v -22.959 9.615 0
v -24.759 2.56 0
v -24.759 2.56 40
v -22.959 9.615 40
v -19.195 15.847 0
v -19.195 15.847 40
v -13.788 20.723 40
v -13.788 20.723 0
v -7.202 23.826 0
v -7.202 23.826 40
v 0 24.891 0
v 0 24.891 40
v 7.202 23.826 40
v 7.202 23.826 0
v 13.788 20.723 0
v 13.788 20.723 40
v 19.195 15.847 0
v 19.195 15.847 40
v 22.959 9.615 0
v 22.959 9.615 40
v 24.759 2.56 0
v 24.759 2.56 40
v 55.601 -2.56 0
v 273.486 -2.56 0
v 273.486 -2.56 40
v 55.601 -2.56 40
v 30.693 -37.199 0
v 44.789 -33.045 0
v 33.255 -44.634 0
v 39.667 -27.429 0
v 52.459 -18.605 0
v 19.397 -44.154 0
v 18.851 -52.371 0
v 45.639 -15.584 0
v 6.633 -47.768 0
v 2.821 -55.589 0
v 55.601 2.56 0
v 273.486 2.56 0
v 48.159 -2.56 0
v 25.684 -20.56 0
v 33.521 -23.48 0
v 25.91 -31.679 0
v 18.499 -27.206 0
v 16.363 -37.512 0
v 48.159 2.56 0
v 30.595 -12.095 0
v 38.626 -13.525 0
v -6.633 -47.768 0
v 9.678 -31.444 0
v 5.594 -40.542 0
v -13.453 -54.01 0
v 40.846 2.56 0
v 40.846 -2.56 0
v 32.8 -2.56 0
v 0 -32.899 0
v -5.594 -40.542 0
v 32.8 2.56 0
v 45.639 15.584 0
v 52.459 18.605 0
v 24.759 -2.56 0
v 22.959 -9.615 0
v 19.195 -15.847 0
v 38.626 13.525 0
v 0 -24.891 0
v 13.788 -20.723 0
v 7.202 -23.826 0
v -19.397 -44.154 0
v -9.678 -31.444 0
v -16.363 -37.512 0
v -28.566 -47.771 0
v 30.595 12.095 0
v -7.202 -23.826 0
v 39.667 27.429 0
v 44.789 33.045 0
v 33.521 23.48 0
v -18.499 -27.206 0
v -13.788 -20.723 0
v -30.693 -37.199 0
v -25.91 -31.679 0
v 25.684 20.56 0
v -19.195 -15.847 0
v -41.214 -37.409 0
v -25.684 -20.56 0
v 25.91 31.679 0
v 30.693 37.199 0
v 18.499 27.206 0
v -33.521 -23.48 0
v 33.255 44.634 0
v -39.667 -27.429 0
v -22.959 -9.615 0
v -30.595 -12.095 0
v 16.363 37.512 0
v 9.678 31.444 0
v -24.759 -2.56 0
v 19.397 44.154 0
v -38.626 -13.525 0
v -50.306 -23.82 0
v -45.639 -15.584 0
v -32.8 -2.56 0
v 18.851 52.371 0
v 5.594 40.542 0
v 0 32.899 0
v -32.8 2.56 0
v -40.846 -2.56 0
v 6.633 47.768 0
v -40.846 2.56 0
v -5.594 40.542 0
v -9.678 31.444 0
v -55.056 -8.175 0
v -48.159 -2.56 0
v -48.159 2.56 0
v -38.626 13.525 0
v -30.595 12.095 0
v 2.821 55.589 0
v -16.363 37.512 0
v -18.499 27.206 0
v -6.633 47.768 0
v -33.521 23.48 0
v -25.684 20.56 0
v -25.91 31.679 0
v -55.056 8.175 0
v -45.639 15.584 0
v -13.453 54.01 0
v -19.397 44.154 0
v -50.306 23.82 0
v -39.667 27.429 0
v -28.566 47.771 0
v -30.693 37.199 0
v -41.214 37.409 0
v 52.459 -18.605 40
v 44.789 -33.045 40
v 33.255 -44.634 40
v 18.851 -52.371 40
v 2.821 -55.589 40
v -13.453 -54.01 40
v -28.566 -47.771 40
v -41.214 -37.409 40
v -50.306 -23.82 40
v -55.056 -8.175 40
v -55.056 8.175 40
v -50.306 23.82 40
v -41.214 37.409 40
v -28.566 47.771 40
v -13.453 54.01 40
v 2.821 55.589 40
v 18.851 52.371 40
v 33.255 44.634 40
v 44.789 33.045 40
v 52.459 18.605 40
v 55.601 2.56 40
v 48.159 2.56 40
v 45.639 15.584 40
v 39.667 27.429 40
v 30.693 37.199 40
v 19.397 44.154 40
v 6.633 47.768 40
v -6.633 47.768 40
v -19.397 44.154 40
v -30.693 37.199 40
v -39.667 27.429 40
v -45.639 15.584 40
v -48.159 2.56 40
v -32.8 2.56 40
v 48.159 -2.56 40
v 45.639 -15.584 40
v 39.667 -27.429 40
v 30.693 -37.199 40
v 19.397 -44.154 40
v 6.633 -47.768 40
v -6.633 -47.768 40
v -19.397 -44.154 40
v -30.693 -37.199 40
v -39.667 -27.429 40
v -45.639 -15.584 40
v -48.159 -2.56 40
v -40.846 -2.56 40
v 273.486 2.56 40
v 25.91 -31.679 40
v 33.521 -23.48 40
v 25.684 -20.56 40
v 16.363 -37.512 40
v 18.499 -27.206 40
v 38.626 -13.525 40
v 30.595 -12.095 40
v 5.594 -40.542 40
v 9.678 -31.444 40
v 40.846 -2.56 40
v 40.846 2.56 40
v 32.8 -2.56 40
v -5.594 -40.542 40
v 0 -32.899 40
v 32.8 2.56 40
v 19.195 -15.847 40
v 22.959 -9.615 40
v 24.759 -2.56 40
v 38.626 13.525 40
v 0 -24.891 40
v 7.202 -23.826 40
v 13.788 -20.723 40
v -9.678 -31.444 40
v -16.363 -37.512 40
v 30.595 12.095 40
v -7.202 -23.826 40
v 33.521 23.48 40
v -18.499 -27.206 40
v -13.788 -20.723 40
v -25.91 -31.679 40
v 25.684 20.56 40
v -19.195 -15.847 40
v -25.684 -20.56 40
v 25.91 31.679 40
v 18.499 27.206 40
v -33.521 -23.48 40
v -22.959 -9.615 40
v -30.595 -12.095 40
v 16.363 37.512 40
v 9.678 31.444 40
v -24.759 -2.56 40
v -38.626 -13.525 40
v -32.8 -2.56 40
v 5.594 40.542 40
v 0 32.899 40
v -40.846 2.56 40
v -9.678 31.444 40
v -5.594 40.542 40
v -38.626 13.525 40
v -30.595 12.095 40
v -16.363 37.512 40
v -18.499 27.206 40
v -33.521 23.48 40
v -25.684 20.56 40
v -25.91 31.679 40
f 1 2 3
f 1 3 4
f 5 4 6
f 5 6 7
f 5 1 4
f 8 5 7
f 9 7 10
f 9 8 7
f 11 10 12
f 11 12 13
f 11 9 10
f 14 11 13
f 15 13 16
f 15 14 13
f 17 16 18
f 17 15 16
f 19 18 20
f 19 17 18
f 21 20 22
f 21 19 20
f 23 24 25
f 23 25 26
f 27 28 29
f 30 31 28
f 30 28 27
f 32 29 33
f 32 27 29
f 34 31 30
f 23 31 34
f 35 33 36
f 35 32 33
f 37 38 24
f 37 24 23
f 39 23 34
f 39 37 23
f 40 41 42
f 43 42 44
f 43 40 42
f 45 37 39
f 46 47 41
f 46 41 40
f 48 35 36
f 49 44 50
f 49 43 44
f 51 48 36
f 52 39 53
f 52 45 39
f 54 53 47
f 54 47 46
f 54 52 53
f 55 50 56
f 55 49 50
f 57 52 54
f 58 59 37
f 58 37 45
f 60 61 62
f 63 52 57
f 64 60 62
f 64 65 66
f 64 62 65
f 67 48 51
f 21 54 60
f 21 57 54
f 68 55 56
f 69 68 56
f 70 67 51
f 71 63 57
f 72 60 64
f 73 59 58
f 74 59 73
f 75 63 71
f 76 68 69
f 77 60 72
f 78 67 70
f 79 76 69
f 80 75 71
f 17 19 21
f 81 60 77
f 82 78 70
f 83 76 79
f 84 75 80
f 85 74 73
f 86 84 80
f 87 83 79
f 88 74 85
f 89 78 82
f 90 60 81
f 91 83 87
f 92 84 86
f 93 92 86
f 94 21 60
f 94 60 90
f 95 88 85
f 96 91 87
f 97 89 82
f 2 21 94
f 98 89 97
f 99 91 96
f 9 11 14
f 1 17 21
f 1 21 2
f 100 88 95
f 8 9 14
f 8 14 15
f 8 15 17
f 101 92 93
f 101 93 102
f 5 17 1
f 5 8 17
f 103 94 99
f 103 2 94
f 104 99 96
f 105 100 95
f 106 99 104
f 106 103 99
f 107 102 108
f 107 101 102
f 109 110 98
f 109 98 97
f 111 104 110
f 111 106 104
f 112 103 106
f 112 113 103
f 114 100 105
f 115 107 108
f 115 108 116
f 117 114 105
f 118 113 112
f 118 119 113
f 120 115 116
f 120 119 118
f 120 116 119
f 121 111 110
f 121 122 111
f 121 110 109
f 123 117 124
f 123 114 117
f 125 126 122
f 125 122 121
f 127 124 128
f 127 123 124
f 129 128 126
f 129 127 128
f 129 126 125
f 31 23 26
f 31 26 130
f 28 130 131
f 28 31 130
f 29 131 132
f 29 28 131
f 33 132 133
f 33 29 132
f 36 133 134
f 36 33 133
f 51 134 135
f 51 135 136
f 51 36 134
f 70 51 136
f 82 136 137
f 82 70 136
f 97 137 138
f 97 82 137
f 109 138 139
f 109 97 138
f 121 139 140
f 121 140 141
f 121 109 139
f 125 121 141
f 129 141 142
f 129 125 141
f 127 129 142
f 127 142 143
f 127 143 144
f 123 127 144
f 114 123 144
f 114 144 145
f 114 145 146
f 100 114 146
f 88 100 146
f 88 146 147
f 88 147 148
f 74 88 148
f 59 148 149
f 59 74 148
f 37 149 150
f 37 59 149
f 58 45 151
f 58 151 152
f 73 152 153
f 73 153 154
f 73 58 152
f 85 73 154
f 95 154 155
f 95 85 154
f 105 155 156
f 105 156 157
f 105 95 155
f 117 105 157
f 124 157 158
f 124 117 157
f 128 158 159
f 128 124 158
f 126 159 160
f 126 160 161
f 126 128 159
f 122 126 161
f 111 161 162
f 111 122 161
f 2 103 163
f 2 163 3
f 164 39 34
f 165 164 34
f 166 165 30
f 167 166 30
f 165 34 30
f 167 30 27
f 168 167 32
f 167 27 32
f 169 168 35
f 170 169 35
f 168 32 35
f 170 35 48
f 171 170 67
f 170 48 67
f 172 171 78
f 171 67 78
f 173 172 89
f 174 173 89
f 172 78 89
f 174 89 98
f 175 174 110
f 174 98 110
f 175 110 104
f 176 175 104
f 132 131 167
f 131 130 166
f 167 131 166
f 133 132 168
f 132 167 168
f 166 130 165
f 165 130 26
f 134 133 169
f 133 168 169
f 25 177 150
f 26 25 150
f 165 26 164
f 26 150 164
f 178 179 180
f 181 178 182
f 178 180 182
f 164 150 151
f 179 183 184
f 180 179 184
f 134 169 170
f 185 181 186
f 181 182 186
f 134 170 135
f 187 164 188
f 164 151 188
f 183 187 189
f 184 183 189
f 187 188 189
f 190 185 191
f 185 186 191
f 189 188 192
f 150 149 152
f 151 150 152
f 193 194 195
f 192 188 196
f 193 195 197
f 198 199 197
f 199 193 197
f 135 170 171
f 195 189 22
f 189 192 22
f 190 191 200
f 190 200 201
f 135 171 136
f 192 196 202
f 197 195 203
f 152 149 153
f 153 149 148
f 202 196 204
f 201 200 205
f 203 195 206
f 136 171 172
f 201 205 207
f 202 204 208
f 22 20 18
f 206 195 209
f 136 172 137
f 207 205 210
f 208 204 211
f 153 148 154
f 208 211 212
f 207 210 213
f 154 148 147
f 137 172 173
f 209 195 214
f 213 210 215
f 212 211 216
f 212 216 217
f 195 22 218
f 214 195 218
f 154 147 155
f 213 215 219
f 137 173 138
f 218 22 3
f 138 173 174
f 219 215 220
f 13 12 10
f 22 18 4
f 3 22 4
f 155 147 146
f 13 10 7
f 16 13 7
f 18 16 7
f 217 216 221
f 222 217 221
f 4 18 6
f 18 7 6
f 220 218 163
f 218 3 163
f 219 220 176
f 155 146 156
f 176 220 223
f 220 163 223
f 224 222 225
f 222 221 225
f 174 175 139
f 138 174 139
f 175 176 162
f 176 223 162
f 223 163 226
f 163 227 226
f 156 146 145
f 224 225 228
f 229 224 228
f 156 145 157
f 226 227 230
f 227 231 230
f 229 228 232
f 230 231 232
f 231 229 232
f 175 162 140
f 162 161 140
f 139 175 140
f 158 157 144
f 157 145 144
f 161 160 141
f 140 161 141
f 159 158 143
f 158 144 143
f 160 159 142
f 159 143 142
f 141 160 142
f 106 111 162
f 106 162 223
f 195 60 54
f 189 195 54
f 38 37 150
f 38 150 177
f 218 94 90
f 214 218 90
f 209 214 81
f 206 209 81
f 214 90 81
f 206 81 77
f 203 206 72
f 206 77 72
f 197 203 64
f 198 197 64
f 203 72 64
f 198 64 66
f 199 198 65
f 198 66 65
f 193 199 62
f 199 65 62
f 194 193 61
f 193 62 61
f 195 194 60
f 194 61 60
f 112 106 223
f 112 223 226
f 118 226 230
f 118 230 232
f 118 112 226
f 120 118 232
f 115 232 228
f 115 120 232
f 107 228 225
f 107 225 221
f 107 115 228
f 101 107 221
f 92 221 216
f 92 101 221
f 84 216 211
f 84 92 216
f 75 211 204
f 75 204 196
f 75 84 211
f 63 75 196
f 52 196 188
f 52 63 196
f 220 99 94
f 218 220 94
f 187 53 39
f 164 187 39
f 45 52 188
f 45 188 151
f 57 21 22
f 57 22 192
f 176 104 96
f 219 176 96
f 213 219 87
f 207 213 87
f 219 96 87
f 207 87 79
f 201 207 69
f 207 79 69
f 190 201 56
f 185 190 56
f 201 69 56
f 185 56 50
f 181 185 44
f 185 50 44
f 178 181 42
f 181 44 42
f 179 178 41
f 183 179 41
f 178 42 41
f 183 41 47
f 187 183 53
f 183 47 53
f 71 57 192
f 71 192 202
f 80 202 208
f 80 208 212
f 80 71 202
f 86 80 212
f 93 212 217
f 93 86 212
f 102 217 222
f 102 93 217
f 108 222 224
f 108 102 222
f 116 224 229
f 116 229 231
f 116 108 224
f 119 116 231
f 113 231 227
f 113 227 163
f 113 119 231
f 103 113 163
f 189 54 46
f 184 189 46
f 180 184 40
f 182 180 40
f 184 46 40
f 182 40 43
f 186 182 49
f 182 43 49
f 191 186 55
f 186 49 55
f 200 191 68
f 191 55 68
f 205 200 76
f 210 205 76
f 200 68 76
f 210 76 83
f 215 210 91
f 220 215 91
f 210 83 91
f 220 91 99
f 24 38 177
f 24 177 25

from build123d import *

# Parameters (mm, degrees)
EXTRUDE_4_DEPTH = 40


with BuildPart() as part:
    # 草图2 → 凸台-拉伸4 (new body)
    with BuildSketch(Plane.XY):
        with BuildLine():
            Line((55.601230388, 2.559909891), (273.486476264, 2.559909891))
            Line((273.486476264, 2.559909891), (273.486476264, -2.559909891))
            Line((273.486476264, -2.559909891), (55.601230388, -2.559909891))
            ThreePointArc((55.601230388, -2.559909891), (-55.660128991, 0), (55.601230388, 2.559909891))
        make_face()
        with BuildLine():
            ThreePointArc((32.799591871, 2.559909891), (0, 32.899336856), (-32.799591871, 2.559909891))
            Line((-32.799591871, 2.559909891), (-24.758977016, 2.559909891))
            ThreePointArc((-24.758977016, 2.559909891), (0, 24.890963853), (24.758977016, 2.559909891))
            Line((24.758977016, 2.559909891), (32.799591871, 2.559909891))
        make_face(mode=Mode.SUBTRACT)
        with BuildLine():
            Line((-48.158715074, -2.559909891), (-40.845588283, -2.559909891))
            ThreePointArc((-40.845588283, -2.559909891), (0, -40.925728104), (40.845588283, -2.559909891))
            Line((40.845588283, -2.559909891), (48.158715074, -2.559909891))
            ThreePointArc((48.158715074, -2.559909891), (0, -48.226703974), (-48.158715074, -2.559909891))
        make_face(mode=Mode.SUBTRACT)
        with BuildLine():
            Line((40.845588283, 2.559909891), (48.158715074, 2.559909891))
            ThreePointArc((48.158715074, 2.559909891), (0, 48.226703974), (-48.158715074, 2.559909891))
            Line((-48.158715074, 2.559909891), (-40.845588283, 2.559909891))
            ThreePointArc((-40.845588283, 2.559909891), (0, 40.925728104), (40.845588283, 2.559909891))
        make_face(mode=Mode.SUBTRACT)
        with BuildLine():
            Line((-32.799591871, -2.559909891), (-24.758977016, -2.559909891))
            ThreePointArc((-24.758977016, -2.559909891), (0, -24.890963853), (24.758977016, -2.559909891))
            Line((24.758977016, -2.559909891), (32.799591871, -2.559909891))
            ThreePointArc((32.799591871, -2.559909891), (0, -32.899336856), (-32.799591871, -2.559909891))
        make_face(mode=Mode.SUBTRACT)
    extrude(amount=EXTRUDE_4_DEPTH)


solid = part.part
